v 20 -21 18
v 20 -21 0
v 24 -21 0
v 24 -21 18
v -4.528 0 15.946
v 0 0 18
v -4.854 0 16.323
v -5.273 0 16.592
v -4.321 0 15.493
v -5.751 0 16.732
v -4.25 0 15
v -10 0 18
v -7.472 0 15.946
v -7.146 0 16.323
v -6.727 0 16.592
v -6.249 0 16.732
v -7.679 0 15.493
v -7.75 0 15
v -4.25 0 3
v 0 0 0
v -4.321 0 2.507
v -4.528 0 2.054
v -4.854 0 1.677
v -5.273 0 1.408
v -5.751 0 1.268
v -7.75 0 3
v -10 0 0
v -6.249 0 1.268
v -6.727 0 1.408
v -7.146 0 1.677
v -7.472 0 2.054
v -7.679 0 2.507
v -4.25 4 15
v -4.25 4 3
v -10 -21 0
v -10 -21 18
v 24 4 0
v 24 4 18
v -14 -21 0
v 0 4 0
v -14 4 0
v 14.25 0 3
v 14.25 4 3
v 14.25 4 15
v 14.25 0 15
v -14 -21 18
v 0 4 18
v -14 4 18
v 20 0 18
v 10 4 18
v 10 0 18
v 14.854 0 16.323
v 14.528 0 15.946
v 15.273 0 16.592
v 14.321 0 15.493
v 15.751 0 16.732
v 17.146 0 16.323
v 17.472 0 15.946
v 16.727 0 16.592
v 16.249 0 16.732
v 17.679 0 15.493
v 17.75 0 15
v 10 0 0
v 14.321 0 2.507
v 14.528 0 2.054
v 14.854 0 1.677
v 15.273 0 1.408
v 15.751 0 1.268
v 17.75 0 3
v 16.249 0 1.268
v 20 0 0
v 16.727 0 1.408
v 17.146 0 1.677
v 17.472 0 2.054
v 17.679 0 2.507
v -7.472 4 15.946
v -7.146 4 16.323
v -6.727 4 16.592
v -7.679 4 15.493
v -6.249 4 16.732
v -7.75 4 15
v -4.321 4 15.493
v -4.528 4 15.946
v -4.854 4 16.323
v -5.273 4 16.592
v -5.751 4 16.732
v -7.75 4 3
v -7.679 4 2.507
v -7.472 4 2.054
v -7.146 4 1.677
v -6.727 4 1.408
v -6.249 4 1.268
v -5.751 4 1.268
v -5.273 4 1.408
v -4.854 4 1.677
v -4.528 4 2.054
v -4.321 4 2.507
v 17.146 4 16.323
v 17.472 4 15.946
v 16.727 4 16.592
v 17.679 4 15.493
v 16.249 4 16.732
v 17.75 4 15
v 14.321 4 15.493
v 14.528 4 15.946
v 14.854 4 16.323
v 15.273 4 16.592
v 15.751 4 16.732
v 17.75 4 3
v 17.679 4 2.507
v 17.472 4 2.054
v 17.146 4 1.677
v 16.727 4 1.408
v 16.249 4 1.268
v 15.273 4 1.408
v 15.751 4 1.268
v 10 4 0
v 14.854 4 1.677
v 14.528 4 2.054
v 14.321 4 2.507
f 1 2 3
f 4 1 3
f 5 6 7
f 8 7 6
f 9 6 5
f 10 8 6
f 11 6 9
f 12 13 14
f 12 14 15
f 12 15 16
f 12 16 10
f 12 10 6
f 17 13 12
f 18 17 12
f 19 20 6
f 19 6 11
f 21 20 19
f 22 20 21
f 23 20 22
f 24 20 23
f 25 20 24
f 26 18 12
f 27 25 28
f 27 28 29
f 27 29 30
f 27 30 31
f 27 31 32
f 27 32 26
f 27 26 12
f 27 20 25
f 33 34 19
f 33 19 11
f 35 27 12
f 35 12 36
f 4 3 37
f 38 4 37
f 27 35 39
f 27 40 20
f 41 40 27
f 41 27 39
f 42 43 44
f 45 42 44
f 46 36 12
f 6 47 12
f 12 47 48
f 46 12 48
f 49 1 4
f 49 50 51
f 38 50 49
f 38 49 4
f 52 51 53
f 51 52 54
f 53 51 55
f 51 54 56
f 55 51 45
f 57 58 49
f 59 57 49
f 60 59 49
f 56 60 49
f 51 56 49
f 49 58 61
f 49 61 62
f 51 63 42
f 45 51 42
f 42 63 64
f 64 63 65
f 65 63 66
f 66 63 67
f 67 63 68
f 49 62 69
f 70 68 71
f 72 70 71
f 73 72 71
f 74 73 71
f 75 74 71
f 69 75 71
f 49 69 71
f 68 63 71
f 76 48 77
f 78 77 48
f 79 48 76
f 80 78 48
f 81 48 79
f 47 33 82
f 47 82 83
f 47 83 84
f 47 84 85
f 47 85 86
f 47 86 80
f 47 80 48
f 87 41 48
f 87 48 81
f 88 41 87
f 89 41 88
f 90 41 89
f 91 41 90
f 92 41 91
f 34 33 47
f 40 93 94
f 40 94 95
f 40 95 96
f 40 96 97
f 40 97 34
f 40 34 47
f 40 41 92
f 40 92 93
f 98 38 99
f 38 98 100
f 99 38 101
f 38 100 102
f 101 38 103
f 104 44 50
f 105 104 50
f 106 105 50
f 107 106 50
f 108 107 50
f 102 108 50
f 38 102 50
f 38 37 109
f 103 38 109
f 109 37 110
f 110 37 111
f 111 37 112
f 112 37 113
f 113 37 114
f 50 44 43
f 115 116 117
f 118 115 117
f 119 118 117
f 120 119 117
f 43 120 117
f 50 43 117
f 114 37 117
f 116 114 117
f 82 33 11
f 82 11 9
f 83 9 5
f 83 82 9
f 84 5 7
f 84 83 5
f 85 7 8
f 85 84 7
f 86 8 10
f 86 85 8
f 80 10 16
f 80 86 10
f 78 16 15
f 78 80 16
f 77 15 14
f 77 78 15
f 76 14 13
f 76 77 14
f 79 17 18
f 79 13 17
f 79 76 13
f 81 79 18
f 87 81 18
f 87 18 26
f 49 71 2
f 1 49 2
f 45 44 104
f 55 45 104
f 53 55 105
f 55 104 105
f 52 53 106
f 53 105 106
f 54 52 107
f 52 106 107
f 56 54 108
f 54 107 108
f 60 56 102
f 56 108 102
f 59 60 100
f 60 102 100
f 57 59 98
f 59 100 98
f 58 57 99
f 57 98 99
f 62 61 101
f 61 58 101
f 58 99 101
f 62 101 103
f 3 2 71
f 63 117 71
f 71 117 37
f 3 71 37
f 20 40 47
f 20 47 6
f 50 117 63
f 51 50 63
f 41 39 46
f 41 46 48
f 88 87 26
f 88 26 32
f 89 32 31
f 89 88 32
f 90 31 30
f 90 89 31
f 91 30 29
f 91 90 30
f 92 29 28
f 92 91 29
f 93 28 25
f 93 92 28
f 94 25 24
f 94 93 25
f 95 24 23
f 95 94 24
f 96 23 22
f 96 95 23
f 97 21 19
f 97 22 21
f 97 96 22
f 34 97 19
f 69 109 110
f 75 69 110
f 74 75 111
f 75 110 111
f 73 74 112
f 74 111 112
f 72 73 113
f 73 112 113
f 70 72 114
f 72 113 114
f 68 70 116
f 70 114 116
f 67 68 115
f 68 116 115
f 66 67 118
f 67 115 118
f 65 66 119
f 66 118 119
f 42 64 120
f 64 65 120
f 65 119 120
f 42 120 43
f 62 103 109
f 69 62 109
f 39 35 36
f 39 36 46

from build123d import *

# Parameters (mm, degrees)
BOSS_EXTRUDE1_DEPTH = 18
CUT_EXTRUDE1_DEPTH  = 18


with BuildPart() as part:
    # Sketch2 → Boss-Extrude1 (new body)
    with BuildSketch(Plane.XY):
        Polygon((0, 0), (-10, 0), (-10, -21), (-14, -21), (-14, 4), (0, 4), align=None)
    extrude(amount=BOSS_EXTRUDE1_DEPTH)

    # Sketch3 → Cut-Extrude1 (cut)
    with BuildSketch(Plane(origin=(0, 4, 0), x_dir=(1, 0, 0), z_dir=(0, 1, 0))):
        with BuildLine():
            Line((-4.25, -3), (-4.25, -15))
            ThreePointArc((-4.25, -15), (-6, -16.75), (-7.75, -15))
            Line((-7.75, -15), (-7.75, -3))
            ThreePointArc((-7.75, -3), (-6, -1.25), (-4.25, -3))
        make_face()
    extrude(amount=-CUT_EXTRUDE1_DEPTH, mode=Mode.SUBTRACT)


with BuildPart() as body_2:
    # Mirror2: mirrored copy
    add(part.part.mirror(Plane(origin=(5, 0, 0), x_dir=(0, 0, 1), z_dir=(1, 0, 0))))


solid = Compound([part.part, body_2.part])
